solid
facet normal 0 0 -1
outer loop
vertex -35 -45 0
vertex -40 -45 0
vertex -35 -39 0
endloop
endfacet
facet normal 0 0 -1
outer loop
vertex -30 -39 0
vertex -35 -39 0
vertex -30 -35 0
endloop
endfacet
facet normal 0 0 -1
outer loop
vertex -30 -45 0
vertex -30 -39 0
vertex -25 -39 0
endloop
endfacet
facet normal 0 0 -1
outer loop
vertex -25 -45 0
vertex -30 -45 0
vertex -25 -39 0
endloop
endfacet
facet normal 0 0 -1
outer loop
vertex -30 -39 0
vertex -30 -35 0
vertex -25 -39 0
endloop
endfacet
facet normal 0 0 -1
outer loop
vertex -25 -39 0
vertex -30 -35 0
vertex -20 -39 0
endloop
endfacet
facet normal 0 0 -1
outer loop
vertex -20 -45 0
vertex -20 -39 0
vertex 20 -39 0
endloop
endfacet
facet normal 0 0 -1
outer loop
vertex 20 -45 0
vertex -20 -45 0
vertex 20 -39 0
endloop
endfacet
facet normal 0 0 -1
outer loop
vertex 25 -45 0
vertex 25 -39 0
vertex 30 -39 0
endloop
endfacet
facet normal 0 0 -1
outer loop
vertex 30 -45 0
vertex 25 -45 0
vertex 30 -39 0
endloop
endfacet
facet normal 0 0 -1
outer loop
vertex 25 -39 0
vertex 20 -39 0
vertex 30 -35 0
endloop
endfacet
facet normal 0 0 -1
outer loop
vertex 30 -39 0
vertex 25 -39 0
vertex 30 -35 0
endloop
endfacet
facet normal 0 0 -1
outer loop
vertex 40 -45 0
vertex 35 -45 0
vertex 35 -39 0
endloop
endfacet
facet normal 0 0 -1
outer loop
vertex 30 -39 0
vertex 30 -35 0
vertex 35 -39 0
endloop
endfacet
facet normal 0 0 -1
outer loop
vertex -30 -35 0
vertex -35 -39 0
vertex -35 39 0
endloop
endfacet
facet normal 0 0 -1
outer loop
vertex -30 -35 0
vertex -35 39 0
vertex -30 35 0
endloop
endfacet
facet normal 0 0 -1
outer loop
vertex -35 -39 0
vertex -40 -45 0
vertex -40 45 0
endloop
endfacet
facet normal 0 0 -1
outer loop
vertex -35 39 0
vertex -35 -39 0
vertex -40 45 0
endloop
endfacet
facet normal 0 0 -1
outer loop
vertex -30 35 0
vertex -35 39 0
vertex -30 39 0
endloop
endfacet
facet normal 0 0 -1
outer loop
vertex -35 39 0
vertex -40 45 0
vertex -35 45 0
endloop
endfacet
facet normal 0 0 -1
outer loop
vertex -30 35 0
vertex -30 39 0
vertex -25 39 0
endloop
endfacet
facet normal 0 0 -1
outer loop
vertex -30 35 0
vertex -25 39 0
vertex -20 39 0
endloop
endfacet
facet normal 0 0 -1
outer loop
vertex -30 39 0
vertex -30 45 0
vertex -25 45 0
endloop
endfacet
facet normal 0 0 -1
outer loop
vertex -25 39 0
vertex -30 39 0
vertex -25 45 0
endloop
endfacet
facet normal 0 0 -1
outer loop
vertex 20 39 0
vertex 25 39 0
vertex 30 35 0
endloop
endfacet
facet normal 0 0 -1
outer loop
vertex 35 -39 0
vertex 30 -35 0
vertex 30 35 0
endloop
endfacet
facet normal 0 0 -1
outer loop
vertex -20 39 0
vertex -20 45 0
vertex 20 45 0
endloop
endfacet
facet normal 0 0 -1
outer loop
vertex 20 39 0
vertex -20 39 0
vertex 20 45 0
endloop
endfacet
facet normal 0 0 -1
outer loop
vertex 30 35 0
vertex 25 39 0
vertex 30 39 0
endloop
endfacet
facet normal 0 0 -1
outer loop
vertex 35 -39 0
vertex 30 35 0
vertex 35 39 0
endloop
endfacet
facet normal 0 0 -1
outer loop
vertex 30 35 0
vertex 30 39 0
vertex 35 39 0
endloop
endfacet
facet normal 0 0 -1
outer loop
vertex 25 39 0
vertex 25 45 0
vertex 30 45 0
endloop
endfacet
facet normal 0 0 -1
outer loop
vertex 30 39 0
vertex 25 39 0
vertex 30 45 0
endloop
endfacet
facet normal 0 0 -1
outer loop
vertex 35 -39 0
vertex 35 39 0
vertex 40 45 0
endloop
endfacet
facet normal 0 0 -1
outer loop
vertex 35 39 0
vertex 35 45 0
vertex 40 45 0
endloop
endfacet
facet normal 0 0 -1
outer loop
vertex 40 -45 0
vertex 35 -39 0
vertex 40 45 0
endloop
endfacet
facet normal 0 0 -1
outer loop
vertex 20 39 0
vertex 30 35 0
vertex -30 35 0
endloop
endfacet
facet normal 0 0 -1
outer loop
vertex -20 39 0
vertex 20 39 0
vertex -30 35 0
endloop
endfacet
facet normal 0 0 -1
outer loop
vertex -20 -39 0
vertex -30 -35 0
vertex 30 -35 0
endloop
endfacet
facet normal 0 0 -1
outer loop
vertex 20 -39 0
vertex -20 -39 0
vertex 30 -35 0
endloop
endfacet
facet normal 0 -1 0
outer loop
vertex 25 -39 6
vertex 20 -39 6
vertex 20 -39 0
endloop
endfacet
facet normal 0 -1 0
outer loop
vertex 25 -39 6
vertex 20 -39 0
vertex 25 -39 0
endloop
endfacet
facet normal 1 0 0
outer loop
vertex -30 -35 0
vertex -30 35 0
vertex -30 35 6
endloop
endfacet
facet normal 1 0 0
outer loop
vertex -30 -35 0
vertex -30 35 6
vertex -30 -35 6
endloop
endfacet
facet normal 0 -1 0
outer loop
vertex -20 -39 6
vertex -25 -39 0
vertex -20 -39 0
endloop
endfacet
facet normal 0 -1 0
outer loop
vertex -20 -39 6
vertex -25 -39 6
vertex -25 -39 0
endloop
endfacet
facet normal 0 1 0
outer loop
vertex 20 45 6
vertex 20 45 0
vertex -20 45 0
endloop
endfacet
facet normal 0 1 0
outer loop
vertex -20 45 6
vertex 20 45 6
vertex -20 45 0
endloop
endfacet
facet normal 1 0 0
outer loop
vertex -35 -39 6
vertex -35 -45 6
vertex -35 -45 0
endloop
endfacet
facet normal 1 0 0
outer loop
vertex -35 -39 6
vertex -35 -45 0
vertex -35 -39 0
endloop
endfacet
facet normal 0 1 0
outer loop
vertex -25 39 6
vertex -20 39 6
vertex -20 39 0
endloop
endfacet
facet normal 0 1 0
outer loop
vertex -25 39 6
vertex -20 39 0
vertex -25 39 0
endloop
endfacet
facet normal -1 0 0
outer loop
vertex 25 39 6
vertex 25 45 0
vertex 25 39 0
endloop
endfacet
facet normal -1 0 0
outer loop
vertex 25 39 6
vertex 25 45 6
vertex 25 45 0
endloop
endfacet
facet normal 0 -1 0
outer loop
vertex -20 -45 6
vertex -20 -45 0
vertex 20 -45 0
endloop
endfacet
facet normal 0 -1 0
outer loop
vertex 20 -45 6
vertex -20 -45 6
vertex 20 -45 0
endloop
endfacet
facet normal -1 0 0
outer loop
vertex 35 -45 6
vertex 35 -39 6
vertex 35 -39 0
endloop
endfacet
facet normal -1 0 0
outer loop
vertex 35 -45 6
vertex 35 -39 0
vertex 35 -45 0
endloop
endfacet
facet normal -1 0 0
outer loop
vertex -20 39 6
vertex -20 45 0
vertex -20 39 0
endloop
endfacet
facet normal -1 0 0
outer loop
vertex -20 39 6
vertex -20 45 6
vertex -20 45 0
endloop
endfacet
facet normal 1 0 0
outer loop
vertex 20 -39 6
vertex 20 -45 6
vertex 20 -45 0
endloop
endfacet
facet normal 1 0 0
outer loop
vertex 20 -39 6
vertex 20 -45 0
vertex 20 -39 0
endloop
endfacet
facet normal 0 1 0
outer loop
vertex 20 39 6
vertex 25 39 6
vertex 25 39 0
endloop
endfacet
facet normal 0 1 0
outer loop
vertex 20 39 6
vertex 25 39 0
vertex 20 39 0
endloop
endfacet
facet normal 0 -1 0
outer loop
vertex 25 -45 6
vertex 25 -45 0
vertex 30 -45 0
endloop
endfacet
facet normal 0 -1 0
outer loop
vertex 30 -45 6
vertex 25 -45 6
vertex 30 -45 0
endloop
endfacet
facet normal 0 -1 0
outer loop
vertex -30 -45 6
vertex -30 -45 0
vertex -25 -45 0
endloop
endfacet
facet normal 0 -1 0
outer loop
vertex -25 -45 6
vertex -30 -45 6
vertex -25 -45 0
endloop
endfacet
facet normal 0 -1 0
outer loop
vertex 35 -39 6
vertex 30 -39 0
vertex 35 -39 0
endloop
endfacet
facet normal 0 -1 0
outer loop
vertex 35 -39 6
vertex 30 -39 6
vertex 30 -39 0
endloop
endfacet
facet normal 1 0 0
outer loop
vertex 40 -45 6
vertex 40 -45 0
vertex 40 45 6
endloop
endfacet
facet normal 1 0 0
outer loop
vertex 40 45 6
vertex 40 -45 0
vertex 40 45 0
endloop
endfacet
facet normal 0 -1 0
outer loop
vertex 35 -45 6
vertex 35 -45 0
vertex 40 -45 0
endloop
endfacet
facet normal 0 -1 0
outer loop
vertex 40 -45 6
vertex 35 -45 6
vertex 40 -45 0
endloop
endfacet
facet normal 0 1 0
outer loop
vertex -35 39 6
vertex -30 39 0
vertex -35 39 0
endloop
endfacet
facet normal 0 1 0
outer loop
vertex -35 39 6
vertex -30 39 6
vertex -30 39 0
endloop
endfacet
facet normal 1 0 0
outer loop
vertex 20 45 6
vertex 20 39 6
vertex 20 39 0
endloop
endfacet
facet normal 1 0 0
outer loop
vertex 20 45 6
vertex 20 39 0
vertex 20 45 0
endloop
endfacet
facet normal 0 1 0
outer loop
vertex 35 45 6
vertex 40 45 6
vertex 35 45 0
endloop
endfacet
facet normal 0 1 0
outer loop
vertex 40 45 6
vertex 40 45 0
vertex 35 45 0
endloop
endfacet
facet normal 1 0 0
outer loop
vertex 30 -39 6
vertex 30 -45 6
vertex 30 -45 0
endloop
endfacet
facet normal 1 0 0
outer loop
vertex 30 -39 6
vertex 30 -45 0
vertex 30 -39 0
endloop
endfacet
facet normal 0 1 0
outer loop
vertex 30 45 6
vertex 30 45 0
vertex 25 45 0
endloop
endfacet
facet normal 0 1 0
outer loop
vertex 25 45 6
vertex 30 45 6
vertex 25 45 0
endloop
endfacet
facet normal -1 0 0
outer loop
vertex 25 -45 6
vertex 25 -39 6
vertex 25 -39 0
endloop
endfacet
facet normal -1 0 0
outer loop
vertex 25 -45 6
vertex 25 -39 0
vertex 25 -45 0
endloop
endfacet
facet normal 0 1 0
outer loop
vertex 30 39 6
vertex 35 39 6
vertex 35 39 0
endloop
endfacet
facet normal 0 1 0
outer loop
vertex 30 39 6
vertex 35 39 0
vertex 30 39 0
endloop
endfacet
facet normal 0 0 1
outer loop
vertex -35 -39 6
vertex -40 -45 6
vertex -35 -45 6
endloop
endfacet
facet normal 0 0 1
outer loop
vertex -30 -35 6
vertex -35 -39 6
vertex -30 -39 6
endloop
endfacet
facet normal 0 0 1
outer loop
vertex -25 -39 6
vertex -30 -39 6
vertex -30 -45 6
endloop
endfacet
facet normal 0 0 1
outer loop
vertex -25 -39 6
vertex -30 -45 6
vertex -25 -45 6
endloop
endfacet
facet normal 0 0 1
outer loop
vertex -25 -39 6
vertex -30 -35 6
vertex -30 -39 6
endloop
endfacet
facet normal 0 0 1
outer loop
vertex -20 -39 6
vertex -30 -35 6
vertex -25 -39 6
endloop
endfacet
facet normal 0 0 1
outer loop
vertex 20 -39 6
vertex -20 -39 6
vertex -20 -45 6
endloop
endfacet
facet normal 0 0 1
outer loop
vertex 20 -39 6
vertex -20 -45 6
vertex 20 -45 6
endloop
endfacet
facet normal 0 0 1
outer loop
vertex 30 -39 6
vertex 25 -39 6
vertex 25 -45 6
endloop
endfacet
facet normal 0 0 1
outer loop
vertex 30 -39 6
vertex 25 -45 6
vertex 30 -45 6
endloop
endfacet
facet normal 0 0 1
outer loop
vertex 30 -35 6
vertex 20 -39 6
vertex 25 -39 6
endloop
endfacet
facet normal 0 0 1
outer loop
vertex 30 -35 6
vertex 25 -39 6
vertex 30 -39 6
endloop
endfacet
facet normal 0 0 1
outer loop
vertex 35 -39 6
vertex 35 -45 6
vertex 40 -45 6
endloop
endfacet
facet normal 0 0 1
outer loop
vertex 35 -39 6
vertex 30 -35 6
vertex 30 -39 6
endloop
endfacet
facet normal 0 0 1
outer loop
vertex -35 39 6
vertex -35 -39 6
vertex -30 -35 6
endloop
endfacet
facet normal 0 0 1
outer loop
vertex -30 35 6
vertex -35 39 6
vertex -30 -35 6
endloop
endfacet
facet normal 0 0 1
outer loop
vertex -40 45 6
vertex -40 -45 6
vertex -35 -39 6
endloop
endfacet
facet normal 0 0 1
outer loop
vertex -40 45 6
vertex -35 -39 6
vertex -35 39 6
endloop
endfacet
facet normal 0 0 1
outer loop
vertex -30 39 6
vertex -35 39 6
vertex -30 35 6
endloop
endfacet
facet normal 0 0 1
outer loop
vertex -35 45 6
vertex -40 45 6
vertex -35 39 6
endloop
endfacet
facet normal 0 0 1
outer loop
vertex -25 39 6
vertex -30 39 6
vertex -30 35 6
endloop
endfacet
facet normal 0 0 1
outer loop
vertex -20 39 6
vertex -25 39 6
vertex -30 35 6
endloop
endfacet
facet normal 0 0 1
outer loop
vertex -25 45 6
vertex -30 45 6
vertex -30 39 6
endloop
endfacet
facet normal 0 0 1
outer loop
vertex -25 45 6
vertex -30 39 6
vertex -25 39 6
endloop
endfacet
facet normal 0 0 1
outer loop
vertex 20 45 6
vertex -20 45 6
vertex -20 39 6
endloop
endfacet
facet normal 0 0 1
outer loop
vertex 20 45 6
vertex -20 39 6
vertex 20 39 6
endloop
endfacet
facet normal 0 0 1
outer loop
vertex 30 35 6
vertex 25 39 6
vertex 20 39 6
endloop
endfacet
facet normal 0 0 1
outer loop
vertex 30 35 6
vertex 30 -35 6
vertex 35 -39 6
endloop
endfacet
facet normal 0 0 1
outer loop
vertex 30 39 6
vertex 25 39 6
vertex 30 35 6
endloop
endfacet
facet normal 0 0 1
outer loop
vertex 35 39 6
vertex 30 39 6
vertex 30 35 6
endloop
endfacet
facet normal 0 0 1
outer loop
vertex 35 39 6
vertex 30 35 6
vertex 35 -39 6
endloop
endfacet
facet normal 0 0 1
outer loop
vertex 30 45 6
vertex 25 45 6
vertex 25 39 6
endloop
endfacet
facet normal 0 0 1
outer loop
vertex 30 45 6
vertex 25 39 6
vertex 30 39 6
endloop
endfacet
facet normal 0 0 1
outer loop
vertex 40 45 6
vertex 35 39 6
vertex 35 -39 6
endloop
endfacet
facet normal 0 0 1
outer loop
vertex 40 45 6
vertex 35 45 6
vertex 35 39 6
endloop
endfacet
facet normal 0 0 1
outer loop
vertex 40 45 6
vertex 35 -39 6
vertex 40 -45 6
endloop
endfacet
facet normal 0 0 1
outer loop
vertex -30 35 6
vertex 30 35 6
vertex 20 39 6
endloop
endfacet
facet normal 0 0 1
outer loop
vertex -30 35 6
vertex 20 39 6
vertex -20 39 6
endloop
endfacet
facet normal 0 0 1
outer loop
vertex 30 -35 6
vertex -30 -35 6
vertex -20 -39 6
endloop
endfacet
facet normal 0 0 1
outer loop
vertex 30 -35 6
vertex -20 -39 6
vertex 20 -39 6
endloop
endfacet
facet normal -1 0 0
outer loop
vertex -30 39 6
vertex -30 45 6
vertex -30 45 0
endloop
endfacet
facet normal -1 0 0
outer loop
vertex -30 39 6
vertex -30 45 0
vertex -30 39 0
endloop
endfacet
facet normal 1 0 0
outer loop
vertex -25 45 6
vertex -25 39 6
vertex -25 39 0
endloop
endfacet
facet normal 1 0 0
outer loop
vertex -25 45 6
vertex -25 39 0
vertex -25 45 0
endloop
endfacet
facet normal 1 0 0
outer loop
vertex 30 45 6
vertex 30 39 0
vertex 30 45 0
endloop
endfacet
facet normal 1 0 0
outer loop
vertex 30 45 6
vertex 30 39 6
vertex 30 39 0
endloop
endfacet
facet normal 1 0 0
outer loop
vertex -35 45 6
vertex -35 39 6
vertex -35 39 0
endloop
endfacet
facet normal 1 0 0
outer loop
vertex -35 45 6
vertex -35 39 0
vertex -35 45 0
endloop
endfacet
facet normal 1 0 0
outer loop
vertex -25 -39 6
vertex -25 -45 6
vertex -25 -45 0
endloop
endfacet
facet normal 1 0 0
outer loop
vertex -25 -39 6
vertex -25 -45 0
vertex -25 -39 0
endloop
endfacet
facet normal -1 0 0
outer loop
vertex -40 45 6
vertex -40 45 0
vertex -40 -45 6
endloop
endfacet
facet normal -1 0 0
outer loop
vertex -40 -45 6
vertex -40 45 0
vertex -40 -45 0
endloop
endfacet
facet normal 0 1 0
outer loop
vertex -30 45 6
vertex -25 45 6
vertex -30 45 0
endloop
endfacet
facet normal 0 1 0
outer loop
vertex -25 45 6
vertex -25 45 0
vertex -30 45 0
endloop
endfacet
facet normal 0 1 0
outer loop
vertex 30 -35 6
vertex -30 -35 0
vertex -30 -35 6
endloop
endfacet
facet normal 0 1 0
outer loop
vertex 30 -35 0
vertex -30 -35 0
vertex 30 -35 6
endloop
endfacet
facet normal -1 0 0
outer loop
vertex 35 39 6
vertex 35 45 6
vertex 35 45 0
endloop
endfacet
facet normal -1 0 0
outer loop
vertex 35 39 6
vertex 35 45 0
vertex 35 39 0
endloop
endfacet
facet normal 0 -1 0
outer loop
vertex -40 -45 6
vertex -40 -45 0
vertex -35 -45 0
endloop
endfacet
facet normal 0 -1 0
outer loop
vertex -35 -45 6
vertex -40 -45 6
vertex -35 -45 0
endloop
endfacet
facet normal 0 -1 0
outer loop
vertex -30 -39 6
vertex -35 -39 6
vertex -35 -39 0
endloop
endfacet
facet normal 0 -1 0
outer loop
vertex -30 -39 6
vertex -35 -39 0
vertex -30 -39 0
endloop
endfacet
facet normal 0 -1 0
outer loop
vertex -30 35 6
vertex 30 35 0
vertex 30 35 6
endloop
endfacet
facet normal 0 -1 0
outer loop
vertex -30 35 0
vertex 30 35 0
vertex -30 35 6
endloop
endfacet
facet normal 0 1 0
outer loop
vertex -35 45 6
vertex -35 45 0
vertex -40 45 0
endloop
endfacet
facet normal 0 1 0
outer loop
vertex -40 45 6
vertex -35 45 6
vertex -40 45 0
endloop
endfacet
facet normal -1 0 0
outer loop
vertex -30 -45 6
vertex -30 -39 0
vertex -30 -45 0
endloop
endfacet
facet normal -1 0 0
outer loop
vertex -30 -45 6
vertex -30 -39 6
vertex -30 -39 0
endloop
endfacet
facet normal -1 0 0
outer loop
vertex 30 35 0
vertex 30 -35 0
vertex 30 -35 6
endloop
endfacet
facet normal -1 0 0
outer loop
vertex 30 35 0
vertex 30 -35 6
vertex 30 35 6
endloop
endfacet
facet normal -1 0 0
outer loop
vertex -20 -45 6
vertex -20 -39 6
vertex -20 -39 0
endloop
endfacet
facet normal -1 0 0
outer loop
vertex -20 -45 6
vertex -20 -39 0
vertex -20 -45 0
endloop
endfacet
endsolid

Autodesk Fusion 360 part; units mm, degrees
sketch "Sketch1" plane through (0, 0, 0) normal (0, 0, 1) x (1, 0, 0)
  line L0 (40, 45) -> (-40, 45)
  line L1 (-40, 45) -> (-40, -45)
  line L2 (-40, -45) -> (40, -45)
  line L3 (40, -45) -> (40, 45)
  line L4 (40, 45) -> (-40, -45) construction
  line L5 (-40, 45) -> (40, -45) construction
  line L6 (30, 35) -> (-30, 35)
  line L7 (-30, 35) -> (-30, -35)
  line L8 (-30, -35) -> (30, -35)
  line L9 (30, -35) -> (30, 35)
  line L10 (30, 35) -> (-30, -35) construction
  line L11 (-30, 35) -> (30, -35) construction
  dimension "d1" = 80
  dimension "d2" = 90
  dimension "d3" = 60
  dimension "d6" = 10
extrude "Extrude1" add sketch "Sketch1" along normal blind 6
sketch "Sketch2" plane through (0, 0, 6) normal (0, 0, 1) x (-1, 0, 0)
  line L0 (-30, -35) -> (-30, 35)
  line L1 (-30, 35) -> (30, 35)
  line L2 (30, 35) -> (30, -35)
  line L3 (30, -35) -> (-30, -35)
  line L4 (-40, 45) -> (-40, -45)
  line L5 (-40, -45) -> (40, -45)
  line L6 (40, -45) -> (40, 45)
  line L7 (40, 45) -> (-40, 45)
  line L8 (-40, 45) -> (-35, 45) construction
  line L9 (-35, 45) -> (-35, 39) construction
  line L10 (-35, 39) -> (-40, 39) construction
  line L11 (-40, 39) -> (-40, 45) construction
  line L12 (-35, 45) -> (-30, 45) construction
  line L13 (-30, 45) -> (-30, 39) construction
  line L14 (-30, 39) -> (-35, 39) construction
  line L15 (-35, 39) -> (-35, 45) construction
  line L16 (-30, 45) -> (-25, 45) construction
  line L17 (-25, 45) -> (-25, 39) construction
  line L18 (-25, 39) -> (-30, 39) construction
  line L19 (-30, 39) -> (-30, 45) construction
  line L20 (-25, 45) -> (-20, 45) construction
  line L21 (-20, 45) -> (-20, 39) construction
  line L22 (-20, 39) -> (-25, 39) construction
  line L23 (-25, 39) -> (-25, 45) construction
  line L24 (-30, 39) -> (-35, 39)
  line L25 (-35, 39) -> (-35, 45)
  line L26 (-35, 45) -> (-30, 45)
  line L27 (-30, 45) -> (-30, 39)
  line L28 (-20, 39) -> (-25, 39)
  line L29 (-25, 39) -> (-25, 45)
  line L30 (-25, 45) -> (-20, 45)
  line L31 (-20, 45) -> (-20, 39)
  line L32 (40, 45) -> (35, 45) construction
  line L33 (35, 45) -> (35, 39) construction
  line L34 (35, 39) -> (40, 39) construction
  line L35 (40, 39) -> (40, 45) construction
  line L36 (35, 39) -> (30, 39)
  line L37 (30, 39) -> (30, 45)
  line L38 (30, 45) -> (35, 45)
  line L39 (35, 45) -> (35, 39)
  line L40 (30, 39) -> (25, 39) construction
  line L41 (25, 39) -> (25, 45) construction
  line L42 (25, 45) -> (30, 45) construction
  line L43 (30, 45) -> (30, 39) construction
  line L44 (25, 39) -> (20, 39)
  line L45 (20, 39) -> (20, 45)
  line L46 (20, 45) -> (25, 45)
  line L47 (25, 45) -> (25, 39)
extrude "Extrude2" cut sketch "Sketch2" against normal blind 6 contours L7 L24 L25 L26 L27 | L7 L28 L29 L30 L31
ref_plane "WorkPlane1" through (0, 0, 0) normal (0, 1, 0) x (0, 0, 1)
ref_plane "WorkPlane2" through (0, 0, 0) normal (1, 0, 0) x (0, 1, 0)
extrude "Extrude3" cut sketch "Sketch2" against normal blind 6 contours L7 L24 L25 L26 L27 | L7 L28 L29 L30 L31 | L7 L36 L37 L38 L39 | L7 L44 L45 L46 L47
mirror "Mirror3" about plane through (0, 0, 0) normal (0, 1, 0) of "Extrude3"
